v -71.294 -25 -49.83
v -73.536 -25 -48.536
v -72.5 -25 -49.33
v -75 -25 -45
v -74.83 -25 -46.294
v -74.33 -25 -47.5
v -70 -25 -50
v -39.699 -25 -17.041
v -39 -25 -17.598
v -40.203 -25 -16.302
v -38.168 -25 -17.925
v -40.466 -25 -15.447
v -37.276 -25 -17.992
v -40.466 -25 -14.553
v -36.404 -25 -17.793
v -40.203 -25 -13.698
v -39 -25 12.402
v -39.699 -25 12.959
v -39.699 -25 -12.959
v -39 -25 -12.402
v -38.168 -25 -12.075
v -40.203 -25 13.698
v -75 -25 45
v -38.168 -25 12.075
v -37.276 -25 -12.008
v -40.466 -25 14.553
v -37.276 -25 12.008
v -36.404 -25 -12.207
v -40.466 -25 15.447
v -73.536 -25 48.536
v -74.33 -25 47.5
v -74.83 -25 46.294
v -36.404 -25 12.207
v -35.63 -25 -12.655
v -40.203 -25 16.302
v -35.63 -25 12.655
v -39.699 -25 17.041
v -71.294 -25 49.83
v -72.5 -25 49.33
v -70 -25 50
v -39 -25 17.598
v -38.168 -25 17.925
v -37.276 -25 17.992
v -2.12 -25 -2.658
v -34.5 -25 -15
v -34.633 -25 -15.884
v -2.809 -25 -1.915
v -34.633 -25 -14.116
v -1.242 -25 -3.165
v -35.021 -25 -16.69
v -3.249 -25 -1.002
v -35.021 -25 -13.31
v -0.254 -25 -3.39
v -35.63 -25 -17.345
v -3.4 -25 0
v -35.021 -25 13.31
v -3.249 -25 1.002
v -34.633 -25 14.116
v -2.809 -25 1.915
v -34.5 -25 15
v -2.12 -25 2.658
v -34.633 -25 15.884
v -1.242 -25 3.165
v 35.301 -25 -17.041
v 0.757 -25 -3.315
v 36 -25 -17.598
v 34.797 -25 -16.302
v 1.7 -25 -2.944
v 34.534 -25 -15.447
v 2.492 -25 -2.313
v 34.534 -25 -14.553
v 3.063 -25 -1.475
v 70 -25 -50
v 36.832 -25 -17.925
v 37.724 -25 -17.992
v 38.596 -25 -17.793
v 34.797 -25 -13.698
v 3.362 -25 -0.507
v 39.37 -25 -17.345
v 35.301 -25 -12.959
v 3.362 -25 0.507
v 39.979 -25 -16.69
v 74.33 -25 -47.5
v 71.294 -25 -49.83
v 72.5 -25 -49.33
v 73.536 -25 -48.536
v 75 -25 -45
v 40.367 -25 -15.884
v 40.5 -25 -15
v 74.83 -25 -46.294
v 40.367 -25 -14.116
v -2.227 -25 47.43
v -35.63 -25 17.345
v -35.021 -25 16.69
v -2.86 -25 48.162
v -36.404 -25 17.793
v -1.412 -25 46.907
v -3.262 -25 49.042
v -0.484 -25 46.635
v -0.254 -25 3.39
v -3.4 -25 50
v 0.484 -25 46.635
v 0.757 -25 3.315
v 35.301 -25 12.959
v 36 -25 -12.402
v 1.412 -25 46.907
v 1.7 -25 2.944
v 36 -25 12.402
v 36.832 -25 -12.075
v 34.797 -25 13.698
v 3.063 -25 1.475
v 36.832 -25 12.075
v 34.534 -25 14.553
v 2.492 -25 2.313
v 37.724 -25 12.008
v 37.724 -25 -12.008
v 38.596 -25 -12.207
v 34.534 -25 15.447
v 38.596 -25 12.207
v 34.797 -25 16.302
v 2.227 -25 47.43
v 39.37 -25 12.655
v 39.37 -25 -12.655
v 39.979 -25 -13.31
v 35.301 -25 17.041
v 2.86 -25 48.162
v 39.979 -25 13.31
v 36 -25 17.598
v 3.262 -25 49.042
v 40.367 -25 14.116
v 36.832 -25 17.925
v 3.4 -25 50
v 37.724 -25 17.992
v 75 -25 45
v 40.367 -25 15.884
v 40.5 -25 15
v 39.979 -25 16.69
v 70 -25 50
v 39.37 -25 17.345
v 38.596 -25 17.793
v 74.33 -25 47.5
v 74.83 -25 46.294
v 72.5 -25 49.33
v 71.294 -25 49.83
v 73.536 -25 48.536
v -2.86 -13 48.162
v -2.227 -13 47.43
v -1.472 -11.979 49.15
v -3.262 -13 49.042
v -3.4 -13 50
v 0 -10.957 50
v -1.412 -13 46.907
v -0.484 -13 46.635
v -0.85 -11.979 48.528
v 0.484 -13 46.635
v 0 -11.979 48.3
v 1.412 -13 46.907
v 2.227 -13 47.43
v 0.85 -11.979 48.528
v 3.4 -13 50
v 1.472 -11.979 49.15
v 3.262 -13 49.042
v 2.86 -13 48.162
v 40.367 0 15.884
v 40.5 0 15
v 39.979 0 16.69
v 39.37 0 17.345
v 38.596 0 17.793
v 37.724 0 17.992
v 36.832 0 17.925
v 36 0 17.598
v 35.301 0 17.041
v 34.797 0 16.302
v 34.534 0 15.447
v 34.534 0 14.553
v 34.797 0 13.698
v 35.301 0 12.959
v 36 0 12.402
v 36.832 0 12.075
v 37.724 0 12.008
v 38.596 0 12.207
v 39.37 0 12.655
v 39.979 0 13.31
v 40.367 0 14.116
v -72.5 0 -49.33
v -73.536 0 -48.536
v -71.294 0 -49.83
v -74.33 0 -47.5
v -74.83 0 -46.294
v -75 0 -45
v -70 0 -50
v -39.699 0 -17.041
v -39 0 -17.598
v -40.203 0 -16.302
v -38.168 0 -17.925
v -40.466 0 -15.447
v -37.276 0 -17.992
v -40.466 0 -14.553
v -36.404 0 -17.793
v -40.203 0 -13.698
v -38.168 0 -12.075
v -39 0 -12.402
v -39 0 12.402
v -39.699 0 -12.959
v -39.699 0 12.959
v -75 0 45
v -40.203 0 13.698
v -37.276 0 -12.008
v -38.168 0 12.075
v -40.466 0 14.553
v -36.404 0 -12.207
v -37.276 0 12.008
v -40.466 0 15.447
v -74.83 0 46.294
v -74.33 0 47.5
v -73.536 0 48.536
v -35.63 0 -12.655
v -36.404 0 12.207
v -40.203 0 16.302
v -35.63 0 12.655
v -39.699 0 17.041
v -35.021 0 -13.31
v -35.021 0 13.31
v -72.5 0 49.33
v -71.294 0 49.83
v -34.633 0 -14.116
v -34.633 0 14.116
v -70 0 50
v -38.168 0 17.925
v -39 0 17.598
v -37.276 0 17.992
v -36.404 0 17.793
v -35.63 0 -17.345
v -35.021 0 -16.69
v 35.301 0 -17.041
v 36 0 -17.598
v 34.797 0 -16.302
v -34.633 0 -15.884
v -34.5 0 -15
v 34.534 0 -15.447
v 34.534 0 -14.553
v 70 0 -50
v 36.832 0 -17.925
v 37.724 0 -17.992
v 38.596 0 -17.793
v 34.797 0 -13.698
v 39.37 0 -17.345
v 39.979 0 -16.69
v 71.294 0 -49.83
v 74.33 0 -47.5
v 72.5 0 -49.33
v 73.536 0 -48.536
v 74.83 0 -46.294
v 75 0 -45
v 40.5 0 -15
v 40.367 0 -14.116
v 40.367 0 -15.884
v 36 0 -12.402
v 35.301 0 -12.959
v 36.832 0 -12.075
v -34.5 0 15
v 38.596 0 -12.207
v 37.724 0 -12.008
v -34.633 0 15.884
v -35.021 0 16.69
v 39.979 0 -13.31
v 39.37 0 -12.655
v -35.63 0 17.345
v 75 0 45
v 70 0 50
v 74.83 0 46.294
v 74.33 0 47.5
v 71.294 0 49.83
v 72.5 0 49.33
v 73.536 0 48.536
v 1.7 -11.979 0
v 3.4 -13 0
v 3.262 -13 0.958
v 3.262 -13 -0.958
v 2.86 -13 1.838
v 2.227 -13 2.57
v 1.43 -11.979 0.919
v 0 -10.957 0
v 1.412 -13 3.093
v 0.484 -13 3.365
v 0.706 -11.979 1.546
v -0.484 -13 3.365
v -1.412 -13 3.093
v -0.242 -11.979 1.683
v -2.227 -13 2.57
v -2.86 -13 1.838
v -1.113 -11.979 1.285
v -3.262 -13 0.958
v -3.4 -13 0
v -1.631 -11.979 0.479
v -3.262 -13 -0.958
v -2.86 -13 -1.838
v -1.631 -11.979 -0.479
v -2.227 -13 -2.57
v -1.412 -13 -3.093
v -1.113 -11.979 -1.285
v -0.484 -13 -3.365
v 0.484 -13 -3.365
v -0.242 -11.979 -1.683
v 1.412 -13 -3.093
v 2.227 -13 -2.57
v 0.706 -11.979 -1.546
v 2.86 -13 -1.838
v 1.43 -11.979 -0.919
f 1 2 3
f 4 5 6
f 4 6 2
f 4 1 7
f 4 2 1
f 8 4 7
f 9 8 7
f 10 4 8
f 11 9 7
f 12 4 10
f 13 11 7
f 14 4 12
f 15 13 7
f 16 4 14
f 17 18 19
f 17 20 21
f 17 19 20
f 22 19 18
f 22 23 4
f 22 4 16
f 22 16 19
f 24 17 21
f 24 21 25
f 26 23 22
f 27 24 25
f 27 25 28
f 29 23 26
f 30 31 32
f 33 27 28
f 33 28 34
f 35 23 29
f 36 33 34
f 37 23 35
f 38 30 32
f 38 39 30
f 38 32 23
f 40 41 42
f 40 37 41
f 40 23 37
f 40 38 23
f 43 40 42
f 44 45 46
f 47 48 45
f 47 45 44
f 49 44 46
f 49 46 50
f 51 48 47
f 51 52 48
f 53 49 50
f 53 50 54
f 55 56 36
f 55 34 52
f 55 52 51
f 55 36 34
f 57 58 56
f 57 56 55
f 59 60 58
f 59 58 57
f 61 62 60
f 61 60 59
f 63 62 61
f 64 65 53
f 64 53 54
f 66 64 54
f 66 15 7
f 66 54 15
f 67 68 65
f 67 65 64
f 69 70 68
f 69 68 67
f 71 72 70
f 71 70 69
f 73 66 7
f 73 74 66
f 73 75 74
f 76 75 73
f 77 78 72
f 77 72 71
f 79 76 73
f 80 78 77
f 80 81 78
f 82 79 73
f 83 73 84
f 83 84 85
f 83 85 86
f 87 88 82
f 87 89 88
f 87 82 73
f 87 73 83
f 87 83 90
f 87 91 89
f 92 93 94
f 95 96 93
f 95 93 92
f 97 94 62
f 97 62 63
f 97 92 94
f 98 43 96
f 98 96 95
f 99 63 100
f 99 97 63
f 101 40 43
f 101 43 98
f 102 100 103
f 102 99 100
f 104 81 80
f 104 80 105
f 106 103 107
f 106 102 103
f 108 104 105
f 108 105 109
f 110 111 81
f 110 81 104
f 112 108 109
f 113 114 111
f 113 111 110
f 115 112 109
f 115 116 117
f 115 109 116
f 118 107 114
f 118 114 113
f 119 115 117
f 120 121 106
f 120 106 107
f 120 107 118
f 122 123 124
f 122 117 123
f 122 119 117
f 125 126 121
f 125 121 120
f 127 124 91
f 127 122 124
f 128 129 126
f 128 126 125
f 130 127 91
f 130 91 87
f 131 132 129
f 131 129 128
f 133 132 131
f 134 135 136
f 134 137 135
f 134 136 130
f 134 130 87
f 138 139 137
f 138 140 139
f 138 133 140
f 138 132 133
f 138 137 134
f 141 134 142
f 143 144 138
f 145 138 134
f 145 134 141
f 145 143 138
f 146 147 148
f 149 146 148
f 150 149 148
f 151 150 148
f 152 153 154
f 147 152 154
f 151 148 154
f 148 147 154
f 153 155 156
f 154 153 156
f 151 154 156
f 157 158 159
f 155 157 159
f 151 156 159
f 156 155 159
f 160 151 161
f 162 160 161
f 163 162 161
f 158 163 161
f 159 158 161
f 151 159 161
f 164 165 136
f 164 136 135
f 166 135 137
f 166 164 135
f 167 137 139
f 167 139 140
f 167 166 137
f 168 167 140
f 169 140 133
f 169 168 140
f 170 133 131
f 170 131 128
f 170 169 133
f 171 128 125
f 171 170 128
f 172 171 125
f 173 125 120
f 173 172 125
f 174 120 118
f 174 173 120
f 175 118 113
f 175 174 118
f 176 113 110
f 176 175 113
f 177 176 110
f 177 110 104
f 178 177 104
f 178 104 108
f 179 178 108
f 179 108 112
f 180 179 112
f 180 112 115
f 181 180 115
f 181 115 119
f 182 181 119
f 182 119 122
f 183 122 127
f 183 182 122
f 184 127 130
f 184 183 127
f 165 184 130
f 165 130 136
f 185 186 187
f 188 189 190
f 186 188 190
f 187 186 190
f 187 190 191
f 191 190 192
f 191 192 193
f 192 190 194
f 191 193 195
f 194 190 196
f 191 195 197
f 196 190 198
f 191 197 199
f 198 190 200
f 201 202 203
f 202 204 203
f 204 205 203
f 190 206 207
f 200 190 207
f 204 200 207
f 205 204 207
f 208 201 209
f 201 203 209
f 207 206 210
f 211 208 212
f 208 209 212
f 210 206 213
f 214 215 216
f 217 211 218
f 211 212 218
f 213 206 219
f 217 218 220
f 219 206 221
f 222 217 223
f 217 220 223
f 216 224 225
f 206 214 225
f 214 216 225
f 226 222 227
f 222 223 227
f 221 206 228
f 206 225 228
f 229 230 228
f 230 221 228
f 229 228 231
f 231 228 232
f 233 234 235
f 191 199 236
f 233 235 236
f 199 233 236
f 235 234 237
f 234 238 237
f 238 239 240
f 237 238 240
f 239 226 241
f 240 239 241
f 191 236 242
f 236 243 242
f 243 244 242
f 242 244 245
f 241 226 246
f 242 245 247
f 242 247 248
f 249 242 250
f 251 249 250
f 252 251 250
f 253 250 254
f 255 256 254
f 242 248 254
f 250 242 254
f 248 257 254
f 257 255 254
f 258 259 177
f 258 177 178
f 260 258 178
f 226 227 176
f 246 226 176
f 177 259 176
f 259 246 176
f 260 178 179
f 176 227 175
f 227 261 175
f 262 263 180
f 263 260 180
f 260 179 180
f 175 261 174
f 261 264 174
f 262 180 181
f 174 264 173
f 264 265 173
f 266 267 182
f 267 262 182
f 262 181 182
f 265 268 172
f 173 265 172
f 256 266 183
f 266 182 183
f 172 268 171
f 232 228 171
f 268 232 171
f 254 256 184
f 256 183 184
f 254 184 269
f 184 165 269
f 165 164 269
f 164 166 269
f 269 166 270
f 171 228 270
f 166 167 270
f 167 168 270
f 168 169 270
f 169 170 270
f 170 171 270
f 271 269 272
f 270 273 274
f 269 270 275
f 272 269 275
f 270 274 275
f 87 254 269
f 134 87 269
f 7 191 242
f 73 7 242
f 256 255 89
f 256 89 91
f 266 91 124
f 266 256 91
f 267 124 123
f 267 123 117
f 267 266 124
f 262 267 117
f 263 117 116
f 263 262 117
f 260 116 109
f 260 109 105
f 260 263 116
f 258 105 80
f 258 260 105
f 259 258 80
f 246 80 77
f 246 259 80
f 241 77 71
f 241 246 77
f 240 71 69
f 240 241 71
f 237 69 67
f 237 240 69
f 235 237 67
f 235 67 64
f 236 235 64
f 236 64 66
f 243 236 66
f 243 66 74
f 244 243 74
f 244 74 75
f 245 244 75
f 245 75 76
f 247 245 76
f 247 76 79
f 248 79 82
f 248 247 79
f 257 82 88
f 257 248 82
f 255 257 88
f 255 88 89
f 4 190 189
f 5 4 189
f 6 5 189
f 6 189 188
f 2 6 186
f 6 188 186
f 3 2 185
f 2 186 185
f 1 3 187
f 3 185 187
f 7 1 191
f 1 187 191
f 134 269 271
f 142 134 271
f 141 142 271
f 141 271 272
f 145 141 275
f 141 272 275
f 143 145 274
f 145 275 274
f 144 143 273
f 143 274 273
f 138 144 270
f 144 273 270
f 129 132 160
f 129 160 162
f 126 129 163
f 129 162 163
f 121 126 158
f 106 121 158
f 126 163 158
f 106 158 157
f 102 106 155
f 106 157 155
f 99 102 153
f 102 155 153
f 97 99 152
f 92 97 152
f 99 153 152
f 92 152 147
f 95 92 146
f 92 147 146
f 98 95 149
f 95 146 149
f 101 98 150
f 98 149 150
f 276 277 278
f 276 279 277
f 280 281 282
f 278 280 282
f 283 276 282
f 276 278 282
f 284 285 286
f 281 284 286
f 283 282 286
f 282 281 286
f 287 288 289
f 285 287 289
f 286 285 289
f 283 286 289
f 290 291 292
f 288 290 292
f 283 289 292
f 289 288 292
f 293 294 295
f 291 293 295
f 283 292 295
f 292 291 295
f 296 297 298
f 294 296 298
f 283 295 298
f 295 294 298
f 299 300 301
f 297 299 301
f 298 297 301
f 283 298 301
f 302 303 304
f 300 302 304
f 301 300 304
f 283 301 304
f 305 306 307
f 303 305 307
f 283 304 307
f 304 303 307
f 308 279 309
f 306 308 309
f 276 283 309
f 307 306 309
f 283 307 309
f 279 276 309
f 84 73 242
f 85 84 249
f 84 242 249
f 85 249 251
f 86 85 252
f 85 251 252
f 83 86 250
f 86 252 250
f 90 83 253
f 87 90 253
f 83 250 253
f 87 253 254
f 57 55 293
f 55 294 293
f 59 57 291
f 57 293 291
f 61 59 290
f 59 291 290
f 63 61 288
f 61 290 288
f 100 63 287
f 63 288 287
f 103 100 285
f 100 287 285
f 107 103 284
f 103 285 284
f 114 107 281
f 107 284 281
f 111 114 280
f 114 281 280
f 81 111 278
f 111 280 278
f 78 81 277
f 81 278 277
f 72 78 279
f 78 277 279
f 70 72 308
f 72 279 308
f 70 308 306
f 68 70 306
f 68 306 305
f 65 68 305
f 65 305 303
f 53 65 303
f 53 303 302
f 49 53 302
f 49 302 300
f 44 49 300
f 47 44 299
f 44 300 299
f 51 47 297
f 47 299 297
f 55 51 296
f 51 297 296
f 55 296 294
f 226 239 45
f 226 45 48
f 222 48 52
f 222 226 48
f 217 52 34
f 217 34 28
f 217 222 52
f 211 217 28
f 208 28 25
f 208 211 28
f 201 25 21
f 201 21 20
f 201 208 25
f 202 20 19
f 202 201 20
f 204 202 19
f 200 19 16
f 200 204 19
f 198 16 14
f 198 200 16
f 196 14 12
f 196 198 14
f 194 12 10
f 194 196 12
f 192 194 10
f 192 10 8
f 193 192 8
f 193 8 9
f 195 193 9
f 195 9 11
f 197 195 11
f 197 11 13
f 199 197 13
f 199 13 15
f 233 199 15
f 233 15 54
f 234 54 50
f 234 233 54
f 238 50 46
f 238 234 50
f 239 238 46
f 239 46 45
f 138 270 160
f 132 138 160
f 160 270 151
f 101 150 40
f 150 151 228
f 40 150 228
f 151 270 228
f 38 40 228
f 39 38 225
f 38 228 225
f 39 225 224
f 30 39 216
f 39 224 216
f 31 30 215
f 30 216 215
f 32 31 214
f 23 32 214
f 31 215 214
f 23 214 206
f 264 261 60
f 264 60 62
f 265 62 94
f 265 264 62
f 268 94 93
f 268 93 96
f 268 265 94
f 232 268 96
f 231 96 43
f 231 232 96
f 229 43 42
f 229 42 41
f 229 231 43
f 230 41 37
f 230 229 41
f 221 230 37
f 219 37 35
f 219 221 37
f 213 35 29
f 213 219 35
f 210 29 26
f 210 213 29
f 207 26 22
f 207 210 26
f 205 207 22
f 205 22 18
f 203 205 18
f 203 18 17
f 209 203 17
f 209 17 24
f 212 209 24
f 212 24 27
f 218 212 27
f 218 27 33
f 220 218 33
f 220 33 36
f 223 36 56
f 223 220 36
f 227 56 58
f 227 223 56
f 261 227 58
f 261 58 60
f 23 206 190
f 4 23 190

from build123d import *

# Parameters (mm, degrees)
F0_R     = 3
F1_DEPTH = 25
F3_D     = 6.8
F3_DEPTH = 12
F3_TIP   = 2.0429261047


with BuildPart() as f1:
    # F0 (on Front) → F1 (new body)
    with BuildSketch(Plane.XZ):
        with BuildLine():
            Line((70, 50), (-70, 50))
            ThreePointArc((-70, 50), (-73.5355339059, 48.5355339059), (-75, 45))
            Line((-75, 45), (-75, -45))
            ThreePointArc((-75, -45), (-73.5355339059, -48.5355339059), (-70, -50))
            Line((-70, -50), (70, -50))
            ThreePointArc((70, -50), (73.5355339059, -48.5355339059), (75, -45))
            Line((75, -45), (75, 45))
            ThreePointArc((75, 45), (73.5355339059, 48.5355339059), (70, 50))
        make_face()
        with Locations((-37.5, -15)):
            Circle(F0_R, mode=Mode.SUBTRACT)
        with Locations((37.5, -15)):
            Circle(F0_R, mode=Mode.SUBTRACT)
        with Locations((-37.5, 15)):
            Circle(F0_R, mode=Mode.SUBTRACT)
        with Locations((37.5, 15)):
            Circle(F0_R, mode=Mode.SUBTRACT)
    extrude(amount=F1_DEPTH)

    # F3
    with Locations(Plane.XZ.offset(25)):
        with Locations((0, 0), (0, 50)):
            Hole(F3_D / 2, depth=F3_DEPTH)
            with Locations((0, 0, -(F3_DEPTH + F3_TIP / 2))):  # 118° drill point
                Cone(0, F3_D / 2, F3_TIP, mode=Mode.SUBTRACT)


solid = f1.part
